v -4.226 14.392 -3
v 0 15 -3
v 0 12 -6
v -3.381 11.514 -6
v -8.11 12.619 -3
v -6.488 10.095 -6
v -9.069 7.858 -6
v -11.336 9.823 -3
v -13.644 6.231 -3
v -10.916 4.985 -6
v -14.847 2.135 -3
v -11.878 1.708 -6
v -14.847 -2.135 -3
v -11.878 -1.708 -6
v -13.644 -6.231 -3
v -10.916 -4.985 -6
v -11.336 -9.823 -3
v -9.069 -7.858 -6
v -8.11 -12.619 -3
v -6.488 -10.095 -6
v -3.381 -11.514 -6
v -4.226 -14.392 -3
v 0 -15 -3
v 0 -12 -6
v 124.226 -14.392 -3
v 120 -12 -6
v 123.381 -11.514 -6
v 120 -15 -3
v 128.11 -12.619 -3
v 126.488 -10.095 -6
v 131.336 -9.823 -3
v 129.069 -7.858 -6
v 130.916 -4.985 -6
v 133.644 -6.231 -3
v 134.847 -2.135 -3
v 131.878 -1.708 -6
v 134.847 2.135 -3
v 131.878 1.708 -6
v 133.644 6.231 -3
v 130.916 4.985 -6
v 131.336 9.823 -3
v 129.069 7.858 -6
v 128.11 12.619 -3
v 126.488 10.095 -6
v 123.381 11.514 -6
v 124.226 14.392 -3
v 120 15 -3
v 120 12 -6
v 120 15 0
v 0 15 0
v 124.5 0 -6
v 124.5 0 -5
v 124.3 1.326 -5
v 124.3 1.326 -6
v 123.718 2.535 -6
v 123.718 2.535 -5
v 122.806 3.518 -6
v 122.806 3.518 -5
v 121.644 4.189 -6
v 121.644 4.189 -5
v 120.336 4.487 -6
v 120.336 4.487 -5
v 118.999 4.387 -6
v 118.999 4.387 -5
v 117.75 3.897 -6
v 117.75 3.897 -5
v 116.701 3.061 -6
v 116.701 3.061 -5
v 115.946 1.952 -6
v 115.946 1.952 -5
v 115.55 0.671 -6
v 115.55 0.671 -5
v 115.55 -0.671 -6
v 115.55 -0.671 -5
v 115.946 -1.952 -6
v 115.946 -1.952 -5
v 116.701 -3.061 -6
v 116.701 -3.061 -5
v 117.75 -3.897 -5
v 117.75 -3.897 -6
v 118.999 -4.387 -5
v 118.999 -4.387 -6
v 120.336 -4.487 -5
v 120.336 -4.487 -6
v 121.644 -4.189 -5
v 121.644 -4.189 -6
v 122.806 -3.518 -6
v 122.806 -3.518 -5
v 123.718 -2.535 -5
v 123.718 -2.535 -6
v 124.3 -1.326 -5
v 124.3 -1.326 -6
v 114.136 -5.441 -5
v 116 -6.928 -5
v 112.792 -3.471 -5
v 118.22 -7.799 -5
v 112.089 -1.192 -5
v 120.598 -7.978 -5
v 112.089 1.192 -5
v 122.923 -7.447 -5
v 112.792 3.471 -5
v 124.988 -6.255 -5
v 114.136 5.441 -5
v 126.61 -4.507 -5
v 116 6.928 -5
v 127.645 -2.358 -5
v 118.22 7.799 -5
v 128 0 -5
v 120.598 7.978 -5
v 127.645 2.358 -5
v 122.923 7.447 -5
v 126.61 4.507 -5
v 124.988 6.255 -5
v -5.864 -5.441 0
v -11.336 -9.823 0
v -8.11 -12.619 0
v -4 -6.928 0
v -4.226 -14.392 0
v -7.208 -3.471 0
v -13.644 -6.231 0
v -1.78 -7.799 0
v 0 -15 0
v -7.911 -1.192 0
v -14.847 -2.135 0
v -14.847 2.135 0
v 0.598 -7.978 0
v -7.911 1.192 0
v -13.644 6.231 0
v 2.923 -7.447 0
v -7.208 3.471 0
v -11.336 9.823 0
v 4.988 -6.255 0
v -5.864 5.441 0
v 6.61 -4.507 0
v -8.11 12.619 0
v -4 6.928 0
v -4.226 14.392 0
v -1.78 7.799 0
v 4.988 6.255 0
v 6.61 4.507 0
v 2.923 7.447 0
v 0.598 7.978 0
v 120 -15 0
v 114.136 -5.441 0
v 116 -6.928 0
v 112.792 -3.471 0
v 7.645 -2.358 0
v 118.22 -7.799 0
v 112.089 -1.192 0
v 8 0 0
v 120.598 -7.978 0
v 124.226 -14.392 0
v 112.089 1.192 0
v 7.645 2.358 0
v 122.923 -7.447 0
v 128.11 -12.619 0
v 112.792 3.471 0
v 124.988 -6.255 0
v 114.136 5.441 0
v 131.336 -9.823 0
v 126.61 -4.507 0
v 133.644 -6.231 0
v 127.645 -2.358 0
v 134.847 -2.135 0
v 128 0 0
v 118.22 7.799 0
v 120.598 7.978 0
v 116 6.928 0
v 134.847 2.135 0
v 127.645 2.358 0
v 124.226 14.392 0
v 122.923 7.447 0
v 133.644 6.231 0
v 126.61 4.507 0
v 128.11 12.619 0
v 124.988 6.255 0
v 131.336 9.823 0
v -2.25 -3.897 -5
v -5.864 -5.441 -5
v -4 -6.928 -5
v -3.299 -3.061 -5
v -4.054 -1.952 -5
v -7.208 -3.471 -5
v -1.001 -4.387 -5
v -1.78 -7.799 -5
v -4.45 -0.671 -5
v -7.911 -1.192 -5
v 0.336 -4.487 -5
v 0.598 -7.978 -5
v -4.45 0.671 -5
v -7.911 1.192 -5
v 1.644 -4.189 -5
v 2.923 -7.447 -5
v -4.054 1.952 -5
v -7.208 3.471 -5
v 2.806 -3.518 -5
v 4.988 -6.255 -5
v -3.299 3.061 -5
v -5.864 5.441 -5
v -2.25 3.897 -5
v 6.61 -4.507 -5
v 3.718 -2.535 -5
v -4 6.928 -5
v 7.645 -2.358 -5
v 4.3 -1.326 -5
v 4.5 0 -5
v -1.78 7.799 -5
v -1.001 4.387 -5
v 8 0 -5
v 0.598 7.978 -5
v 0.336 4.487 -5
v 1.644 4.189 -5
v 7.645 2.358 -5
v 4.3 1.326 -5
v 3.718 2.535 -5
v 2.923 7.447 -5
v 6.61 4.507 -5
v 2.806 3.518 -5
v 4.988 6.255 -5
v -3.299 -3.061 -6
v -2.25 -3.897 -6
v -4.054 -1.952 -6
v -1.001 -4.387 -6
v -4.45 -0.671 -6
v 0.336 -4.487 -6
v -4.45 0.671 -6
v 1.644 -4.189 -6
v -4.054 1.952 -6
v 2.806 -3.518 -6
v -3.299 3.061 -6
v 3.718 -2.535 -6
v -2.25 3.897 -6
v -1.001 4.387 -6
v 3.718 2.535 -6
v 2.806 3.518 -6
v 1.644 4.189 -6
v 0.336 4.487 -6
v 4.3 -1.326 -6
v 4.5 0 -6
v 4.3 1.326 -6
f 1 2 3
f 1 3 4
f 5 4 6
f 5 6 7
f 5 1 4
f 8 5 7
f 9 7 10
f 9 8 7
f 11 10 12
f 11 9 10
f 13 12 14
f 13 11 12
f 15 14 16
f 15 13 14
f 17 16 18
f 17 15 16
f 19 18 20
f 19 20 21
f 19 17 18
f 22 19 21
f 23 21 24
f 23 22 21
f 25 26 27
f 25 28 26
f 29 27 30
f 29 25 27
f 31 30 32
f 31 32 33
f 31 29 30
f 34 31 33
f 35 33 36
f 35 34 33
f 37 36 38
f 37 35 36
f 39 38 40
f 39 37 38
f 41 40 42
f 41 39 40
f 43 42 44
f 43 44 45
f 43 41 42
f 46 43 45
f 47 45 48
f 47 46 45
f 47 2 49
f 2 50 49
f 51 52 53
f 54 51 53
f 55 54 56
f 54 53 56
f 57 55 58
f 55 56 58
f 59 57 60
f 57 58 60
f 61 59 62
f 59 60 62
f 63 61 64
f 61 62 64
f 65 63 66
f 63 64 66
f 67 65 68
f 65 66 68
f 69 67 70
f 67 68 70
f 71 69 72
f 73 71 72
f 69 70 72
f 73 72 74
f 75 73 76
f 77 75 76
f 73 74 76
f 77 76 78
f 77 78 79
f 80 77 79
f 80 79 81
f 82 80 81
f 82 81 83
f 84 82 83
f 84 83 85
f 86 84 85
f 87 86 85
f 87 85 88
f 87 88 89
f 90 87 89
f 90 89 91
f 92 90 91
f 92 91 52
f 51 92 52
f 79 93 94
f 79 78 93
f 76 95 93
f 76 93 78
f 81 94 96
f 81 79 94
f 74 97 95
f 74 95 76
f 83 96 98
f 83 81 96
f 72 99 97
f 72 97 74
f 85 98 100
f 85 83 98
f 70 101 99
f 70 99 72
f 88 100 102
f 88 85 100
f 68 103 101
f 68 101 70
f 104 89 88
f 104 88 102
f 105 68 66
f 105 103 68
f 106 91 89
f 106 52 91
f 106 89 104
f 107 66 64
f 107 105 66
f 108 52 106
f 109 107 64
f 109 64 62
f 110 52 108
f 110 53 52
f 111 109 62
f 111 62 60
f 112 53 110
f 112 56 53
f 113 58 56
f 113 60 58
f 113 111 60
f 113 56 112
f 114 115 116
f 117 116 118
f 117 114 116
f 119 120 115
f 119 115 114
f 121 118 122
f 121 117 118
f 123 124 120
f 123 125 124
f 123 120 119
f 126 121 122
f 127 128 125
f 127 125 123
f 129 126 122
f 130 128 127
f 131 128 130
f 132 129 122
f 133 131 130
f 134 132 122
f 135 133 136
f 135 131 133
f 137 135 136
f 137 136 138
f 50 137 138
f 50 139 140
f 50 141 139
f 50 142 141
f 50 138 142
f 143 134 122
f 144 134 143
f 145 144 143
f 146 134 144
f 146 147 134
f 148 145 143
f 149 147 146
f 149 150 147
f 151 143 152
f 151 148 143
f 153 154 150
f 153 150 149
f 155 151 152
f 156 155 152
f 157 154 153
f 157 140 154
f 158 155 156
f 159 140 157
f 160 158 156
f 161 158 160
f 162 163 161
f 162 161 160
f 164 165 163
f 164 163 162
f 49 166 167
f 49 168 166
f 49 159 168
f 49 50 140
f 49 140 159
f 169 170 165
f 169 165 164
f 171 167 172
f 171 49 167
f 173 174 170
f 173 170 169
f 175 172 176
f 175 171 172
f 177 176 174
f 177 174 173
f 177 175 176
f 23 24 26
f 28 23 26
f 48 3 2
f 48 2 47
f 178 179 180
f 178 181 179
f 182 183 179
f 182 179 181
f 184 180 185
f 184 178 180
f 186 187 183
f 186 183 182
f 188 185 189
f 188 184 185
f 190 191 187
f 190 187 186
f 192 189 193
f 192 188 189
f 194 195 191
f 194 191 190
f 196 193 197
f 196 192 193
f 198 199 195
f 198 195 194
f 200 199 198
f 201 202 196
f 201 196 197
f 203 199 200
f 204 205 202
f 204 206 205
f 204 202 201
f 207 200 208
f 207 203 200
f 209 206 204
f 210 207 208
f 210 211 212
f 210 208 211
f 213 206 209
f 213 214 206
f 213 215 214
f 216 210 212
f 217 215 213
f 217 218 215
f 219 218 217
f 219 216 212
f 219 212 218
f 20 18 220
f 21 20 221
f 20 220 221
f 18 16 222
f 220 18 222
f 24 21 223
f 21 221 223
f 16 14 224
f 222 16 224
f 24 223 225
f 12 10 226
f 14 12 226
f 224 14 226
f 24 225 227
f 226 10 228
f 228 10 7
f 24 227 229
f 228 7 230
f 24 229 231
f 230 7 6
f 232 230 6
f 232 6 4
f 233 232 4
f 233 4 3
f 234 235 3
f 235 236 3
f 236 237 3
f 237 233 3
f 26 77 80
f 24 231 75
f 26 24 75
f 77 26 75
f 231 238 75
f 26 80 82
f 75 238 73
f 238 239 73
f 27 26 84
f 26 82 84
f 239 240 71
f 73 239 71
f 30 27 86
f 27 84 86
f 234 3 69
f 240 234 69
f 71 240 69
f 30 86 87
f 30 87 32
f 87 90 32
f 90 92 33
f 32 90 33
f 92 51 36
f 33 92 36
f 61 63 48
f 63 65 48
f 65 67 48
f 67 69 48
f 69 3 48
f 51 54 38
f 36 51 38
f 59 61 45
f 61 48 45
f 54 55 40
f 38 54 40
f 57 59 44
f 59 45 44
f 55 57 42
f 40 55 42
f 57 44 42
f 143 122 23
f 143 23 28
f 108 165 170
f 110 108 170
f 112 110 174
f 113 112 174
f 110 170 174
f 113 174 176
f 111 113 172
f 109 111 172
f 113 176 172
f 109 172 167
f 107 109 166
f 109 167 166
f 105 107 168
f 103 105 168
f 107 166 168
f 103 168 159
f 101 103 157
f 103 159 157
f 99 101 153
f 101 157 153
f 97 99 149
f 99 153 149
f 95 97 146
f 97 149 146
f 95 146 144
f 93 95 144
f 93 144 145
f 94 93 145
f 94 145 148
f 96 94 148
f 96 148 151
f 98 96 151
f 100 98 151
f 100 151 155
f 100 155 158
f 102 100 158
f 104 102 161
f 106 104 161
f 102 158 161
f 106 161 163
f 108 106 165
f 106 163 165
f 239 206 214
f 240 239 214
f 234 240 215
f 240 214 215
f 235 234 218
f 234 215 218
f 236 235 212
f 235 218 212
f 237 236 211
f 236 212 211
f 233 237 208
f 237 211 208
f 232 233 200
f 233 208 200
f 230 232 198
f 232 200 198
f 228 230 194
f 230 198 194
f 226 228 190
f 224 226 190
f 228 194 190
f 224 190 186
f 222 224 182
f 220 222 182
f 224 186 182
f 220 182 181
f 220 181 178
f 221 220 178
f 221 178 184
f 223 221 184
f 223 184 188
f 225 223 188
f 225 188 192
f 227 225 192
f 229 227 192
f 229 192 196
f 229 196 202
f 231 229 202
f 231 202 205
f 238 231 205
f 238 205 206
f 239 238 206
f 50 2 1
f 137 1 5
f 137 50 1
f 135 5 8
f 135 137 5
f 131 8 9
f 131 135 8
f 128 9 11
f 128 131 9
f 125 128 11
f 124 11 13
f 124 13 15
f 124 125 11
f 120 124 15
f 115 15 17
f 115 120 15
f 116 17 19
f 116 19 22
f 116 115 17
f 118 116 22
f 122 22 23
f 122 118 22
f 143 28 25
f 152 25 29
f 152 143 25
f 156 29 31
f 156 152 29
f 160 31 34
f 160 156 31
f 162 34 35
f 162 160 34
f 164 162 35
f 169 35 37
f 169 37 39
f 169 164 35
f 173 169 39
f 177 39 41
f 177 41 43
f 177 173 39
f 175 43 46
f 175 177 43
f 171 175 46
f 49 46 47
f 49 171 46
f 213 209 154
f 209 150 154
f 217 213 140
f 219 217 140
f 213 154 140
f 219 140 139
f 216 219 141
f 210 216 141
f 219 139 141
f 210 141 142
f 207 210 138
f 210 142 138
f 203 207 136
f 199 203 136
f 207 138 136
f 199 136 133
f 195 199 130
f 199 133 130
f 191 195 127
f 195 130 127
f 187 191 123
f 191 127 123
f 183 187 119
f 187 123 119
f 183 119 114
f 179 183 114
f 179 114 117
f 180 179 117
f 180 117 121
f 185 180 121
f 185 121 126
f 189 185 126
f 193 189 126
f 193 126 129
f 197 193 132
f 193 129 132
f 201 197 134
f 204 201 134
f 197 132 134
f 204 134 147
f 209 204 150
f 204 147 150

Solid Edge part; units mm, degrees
sketch "Sketch1" plane through (0, 0, 0) normal (0, 0, 1) x (1, 0, 0)
  line L0 (0, -15) -> (120, -15)
  line L1 (0, 15) -> (120, 15)
  arc A0 (120, 15) -> (120, -15) centre (120, 0) cw
  arc A1 (0, -15) -> (0, 15) centre (0, 0) cw
extrude "Protrusion1" add sketch "Sketch1" against normal blind 6
sketch "Sketch2" plane through (0, 0, 0) normal (0, 0, 1) x (1, 0, 0)
  circle A0 centre (0, 0) radius 8
  circle A1 centre (120, 0) radius 8
  dimension "D1" = 16
  dimension "D2" = 30
  dimension "D3" = 30
  dimension "D4" = 16
  dimension "D5" = 120
extrude "VaciadoExtruido_1" cut sketch "Sketch2" against normal blind 5
sketch "Sketch3" plane through (0, 0, -5) normal (0, 0, 1) x (1, 0, 0)
  circle A0 centre (0, 0) radius 4.5
  circle A1 centre (120, 0) radius 4.5
  dimension "D1" = 9
extrude "Cutout1" cut sketch "Sketch3" against normal through all
chamfer "Chaflán_1" distance 3 angle 45 4 edges at (60, -15, -6) (135, 0, -6) (60, 15, -6) (-15, 0, -6)
